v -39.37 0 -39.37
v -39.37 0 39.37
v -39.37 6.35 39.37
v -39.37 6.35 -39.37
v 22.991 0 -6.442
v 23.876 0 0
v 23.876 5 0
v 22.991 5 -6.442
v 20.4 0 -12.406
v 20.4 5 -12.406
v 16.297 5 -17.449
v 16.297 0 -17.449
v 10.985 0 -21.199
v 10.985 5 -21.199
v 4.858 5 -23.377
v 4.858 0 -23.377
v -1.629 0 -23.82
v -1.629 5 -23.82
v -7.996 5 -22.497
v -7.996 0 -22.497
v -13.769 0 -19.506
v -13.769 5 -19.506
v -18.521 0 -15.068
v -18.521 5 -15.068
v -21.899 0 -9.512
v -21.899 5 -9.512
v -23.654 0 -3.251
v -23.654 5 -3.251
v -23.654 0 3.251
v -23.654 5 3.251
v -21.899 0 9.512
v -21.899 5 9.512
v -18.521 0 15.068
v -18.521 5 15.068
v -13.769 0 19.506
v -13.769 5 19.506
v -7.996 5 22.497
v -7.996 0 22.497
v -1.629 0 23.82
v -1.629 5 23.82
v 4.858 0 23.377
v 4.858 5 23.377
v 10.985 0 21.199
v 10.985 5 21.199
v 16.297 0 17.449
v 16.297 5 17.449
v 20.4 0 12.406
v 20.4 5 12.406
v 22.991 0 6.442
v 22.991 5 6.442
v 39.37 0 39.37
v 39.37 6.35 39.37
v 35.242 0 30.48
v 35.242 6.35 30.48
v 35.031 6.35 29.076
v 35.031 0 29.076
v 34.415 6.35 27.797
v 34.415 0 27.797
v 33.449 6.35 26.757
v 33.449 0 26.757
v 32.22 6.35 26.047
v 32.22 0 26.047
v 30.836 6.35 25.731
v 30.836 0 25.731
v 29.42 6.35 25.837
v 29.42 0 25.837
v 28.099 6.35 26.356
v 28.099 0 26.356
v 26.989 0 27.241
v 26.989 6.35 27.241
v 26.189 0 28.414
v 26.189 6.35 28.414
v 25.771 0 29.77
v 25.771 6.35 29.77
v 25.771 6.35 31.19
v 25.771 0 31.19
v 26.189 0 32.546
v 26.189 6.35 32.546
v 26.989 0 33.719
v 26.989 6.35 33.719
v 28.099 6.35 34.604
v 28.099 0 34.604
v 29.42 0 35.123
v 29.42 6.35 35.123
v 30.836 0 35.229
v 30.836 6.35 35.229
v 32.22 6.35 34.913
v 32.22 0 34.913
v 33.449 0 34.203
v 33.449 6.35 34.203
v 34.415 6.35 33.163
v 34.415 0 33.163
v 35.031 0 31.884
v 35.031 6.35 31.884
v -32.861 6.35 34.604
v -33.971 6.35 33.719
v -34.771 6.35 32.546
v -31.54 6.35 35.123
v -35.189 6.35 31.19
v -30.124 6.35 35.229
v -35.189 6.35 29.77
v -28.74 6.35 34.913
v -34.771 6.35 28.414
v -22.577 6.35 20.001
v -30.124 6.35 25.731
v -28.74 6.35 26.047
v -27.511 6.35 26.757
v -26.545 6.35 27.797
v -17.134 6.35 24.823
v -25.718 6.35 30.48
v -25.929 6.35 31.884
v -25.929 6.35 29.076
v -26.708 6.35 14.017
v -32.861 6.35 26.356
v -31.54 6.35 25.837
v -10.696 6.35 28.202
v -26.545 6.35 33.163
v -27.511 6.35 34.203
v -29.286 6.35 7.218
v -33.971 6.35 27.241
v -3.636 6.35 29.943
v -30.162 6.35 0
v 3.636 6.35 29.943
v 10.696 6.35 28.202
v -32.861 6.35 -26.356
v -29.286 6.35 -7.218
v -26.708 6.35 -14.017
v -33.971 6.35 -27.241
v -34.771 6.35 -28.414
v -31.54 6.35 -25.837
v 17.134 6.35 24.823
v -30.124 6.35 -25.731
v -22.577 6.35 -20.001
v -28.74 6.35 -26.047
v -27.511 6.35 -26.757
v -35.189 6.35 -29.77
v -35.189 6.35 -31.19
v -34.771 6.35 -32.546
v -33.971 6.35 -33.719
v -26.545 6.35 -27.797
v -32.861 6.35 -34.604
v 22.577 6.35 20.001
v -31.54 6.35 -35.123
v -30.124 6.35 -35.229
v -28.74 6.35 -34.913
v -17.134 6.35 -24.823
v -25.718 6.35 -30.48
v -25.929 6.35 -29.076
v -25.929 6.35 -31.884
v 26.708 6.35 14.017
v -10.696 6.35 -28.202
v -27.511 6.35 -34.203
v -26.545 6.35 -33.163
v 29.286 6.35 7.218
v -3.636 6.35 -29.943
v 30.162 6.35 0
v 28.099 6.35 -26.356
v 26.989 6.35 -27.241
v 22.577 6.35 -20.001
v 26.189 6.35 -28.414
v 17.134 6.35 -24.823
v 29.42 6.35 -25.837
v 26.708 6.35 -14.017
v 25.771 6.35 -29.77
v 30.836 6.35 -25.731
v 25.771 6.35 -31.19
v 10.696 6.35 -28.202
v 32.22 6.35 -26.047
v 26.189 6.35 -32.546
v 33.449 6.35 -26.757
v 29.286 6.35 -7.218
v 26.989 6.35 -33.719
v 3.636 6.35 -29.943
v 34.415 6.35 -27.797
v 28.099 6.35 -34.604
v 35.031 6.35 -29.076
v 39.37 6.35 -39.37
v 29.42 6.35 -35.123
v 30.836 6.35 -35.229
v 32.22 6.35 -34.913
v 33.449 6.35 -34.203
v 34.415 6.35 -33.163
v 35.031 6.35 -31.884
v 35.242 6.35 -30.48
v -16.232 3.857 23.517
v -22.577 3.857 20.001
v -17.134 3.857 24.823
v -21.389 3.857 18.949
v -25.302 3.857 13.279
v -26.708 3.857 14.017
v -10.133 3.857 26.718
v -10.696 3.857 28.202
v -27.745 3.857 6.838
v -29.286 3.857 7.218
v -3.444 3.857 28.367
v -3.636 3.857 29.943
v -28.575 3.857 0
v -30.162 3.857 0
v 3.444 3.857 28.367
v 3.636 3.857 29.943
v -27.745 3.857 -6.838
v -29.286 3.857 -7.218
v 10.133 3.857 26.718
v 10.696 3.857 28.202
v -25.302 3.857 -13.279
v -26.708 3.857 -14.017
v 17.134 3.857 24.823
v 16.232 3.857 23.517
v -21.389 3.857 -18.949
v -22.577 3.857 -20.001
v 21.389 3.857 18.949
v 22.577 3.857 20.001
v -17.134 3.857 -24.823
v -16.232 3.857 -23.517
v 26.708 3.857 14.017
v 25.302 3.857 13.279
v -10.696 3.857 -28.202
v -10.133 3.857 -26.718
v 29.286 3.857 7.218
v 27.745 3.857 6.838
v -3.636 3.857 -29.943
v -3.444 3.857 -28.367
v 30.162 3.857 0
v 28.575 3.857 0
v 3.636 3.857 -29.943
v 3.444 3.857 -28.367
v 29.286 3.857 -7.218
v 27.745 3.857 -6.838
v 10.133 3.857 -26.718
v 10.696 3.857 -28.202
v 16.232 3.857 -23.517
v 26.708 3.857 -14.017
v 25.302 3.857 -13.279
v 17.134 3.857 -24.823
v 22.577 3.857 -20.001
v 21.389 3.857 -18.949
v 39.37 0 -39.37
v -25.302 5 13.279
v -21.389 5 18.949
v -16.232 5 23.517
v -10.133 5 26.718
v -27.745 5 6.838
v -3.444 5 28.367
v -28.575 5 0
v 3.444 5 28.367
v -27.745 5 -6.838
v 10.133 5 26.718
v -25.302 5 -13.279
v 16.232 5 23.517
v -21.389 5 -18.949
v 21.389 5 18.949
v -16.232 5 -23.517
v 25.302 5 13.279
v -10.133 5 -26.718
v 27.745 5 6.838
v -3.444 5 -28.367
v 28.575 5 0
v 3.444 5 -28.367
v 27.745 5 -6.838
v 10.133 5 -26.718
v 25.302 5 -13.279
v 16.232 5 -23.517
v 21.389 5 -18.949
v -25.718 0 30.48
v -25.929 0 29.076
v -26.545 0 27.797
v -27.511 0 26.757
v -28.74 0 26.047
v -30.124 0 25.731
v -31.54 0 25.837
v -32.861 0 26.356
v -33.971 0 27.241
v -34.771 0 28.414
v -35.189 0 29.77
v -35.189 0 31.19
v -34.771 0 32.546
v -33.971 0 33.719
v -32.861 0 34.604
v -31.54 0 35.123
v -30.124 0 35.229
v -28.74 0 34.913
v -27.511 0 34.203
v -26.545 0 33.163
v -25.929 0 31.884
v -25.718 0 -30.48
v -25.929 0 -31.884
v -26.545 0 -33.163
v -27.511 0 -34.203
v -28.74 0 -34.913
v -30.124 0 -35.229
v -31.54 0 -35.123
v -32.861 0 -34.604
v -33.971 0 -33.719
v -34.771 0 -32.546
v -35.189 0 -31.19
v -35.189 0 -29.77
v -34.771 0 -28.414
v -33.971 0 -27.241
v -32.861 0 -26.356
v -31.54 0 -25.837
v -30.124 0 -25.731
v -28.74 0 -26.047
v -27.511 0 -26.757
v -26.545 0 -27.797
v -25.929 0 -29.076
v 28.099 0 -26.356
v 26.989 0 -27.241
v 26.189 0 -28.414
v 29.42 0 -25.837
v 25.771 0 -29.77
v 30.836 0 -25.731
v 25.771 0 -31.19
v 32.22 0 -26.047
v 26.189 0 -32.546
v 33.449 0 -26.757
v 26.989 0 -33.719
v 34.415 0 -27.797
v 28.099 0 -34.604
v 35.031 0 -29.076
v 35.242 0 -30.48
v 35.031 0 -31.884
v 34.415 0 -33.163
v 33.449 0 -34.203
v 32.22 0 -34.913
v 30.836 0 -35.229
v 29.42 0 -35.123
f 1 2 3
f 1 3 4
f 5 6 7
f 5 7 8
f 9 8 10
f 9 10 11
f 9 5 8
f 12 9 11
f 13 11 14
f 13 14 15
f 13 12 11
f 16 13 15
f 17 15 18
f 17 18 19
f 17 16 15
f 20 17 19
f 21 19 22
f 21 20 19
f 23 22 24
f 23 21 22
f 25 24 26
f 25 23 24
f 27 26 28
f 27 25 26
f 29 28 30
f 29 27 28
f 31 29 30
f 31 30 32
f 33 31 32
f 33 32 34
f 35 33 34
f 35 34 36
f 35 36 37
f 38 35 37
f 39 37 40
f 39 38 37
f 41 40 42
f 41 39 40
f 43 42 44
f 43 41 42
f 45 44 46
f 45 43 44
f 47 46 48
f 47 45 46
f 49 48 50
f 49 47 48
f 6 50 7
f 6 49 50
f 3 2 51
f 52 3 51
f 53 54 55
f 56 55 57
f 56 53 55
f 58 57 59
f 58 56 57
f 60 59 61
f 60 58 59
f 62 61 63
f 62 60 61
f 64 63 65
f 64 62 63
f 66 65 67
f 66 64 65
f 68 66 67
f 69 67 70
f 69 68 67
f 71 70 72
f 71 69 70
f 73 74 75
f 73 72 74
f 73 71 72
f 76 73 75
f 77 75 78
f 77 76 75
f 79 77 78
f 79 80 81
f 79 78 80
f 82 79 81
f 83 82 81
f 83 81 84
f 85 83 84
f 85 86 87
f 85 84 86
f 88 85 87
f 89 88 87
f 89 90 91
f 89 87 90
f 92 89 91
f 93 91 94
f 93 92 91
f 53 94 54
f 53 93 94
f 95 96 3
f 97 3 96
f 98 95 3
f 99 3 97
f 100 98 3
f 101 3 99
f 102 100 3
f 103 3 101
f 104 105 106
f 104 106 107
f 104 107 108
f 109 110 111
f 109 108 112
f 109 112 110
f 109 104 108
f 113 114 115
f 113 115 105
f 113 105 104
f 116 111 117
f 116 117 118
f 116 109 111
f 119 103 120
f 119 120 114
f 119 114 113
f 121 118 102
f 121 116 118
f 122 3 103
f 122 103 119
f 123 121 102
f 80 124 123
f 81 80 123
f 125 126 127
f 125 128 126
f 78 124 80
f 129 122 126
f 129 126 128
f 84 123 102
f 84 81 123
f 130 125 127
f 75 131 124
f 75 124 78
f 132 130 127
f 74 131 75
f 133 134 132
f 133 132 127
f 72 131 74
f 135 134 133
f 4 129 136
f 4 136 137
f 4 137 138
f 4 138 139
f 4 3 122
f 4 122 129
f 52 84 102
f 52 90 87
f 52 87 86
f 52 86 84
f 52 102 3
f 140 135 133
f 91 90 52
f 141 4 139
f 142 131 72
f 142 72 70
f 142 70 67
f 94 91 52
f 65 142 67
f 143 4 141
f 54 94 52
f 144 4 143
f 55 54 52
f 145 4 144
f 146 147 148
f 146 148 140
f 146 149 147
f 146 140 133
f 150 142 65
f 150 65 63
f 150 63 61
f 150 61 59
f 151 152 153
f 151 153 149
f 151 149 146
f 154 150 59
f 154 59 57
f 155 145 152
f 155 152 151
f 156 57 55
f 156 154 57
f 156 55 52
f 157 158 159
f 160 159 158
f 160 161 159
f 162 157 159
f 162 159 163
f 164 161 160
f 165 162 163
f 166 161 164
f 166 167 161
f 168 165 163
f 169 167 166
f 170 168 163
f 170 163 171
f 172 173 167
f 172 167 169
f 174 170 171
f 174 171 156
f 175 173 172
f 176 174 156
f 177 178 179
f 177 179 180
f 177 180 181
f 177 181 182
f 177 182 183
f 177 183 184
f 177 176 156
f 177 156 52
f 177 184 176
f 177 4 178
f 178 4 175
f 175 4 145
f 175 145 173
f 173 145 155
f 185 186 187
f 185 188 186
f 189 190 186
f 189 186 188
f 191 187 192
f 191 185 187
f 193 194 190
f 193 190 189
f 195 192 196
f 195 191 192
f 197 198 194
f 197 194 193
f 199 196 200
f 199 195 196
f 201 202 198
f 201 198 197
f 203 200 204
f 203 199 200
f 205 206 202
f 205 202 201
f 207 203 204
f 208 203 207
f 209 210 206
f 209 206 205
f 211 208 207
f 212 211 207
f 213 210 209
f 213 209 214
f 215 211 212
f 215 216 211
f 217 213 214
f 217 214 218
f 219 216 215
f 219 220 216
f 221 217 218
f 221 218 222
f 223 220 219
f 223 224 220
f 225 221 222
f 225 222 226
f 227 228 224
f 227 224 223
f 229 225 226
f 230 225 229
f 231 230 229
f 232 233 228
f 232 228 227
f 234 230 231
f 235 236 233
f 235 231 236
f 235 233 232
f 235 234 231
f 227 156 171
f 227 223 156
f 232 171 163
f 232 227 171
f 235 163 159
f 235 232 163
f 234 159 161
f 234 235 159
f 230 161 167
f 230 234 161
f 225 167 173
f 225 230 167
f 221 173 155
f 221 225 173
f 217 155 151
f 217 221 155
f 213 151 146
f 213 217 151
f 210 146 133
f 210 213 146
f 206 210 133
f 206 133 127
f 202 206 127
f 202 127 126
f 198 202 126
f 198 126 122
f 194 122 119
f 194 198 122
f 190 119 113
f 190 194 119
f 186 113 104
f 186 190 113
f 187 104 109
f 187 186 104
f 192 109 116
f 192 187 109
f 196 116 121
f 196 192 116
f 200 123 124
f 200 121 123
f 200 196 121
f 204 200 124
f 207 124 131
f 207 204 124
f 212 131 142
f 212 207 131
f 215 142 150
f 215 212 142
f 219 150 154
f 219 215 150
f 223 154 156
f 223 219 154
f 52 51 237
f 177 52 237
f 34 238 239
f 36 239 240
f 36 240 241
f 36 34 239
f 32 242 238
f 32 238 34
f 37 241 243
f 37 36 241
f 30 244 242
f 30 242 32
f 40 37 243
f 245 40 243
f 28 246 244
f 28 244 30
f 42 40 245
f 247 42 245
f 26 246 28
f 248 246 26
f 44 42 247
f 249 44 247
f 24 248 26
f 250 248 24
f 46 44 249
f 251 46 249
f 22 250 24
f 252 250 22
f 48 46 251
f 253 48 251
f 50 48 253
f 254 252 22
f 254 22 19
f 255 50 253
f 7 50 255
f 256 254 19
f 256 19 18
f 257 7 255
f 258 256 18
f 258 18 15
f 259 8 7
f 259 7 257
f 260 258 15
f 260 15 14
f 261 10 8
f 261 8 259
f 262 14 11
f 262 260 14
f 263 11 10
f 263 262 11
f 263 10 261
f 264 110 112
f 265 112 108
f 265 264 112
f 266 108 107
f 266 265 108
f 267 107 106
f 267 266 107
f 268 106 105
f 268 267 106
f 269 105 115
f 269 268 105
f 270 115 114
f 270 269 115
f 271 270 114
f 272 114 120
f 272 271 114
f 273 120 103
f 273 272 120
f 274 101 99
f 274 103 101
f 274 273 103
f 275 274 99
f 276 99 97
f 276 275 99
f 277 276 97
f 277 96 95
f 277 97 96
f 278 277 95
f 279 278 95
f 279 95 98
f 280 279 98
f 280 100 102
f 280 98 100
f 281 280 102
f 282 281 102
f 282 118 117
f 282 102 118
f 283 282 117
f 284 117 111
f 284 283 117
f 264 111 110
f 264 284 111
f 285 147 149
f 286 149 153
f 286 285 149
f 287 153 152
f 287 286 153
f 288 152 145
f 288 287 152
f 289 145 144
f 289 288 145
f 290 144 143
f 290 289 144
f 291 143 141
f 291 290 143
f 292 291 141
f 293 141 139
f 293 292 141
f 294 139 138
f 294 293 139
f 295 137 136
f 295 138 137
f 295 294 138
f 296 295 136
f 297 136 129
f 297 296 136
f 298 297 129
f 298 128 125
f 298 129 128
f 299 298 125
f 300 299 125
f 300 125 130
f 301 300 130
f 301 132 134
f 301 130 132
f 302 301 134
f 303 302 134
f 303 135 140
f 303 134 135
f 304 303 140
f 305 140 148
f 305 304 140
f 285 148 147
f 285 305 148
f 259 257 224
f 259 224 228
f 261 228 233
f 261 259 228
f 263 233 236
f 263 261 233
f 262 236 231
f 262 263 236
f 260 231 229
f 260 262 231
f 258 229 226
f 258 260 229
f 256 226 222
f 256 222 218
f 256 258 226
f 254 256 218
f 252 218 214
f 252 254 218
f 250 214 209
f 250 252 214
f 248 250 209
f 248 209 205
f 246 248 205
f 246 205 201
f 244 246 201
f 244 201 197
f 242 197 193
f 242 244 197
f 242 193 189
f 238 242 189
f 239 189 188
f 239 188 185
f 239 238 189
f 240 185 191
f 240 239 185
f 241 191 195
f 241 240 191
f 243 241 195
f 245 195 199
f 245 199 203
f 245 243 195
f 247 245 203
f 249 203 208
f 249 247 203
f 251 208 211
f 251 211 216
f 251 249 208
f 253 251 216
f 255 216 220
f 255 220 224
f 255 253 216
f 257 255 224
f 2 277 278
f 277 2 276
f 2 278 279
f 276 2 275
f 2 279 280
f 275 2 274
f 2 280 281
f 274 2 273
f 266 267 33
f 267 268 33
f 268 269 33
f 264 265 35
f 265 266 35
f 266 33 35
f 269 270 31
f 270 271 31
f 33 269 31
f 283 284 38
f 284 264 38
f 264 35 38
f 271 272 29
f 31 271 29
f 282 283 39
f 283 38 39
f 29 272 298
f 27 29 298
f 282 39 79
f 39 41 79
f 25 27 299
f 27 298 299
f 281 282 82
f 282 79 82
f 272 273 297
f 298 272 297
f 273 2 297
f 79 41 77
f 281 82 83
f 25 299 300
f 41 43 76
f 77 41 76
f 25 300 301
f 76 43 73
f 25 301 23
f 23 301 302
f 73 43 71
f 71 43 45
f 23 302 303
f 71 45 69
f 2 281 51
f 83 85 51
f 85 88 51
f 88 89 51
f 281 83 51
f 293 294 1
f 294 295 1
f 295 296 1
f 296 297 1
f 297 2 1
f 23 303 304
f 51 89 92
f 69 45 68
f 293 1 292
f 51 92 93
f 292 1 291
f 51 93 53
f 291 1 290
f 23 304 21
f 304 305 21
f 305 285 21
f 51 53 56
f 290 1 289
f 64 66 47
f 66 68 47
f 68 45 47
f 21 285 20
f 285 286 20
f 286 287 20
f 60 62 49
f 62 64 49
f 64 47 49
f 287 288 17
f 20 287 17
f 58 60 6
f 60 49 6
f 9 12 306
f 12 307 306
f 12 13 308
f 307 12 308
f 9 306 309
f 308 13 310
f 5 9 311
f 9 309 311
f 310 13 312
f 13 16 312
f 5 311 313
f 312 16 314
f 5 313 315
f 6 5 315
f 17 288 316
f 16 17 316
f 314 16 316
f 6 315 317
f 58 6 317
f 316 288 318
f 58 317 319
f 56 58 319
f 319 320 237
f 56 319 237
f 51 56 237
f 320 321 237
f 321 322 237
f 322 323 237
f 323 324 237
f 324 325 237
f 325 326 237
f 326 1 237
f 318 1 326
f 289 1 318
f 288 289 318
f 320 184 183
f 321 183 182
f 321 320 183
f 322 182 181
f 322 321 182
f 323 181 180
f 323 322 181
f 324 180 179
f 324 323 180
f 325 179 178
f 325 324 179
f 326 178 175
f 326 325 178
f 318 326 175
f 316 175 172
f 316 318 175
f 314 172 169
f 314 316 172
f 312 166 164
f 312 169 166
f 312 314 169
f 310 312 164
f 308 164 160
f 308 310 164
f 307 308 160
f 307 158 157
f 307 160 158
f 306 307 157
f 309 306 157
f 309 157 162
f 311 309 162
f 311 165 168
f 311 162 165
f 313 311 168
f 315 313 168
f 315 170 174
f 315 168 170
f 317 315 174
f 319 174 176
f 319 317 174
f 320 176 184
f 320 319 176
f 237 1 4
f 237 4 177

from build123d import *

# Parameters (mm, degrees)
PLATEOUTLINE_W      = 78.74
PLATEOUTLINE_H      = 78.74
BOSS_EXTRUDE1_DEPTH = 6.35
RAILGUIDES_R        = 4.7625
CUT_EXTRUDE1_DEPTH  = 10
CUT_EXTRUDE2_START  = 5
FUELGRAINMOUNTING_R = 30.1625
CUT_EXTRUDE2_DEPTH  = 5
GASINTAKE_R         = 23.876
CUT_EXTRUDE3_DEPTH  = 5
CUT_EXTRUDE4_START  = 3.857
SKETCH1_R           = 30.1625
SKETCH1_R_2         = 28.575
CUT_EXTRUDE4_DEPTH  = 1.143


with BuildPart() as part:
    # plateOutline → Boss-Extrude1 (new body)
    with BuildSketch(Plane(origin=(0, 0, 0), x_dir=(1, 0, 0), z_dir=(0, 1, 0))):
        Rectangle(PLATEOUTLINE_W, PLATEOUTLINE_H)
    extrude(amount=BOSS_EXTRUDE1_DEPTH)

    # railGuides → Cut-Extrude1 (cut)
    with BuildSketch(Plane(origin=(0, 0, 0), x_dir=(1, 0, 0), z_dir=(0, 1, 0))):
        with Locations((-30.48, 30.48)):
            Circle(RAILGUIDES_R)
        with Locations((30.48, 30.48)):
            Circle(RAILGUIDES_R)
        with Locations((30.48, -30.48)):
            Circle(RAILGUIDES_R)
        with Locations((-30.48, -30.48)):
            Circle(RAILGUIDES_R)
    extrude(amount=CUT_EXTRUDE1_DEPTH, mode=Mode.SUBTRACT)

    # FuelGrainMounting → Cut-Extrude2 (cut)
    with BuildSketch(Plane(origin=(0, 0, 0), x_dir=(1, 0, 0), z_dir=(0, 1, 0)).offset(CUT_EXTRUDE2_START)):
        Circle(FUELGRAINMOUNTING_R)
    extrude(amount=CUT_EXTRUDE2_DEPTH, mode=Mode.SUBTRACT)

    # GasIntake → Cut-Extrude3 (cut)
    with BuildSketch(Plane(origin=(0, 0, 0), x_dir=(1, 0, 0), z_dir=(0, 1, 0))):
        Circle(GASINTAKE_R)
    extrude(amount=CUT_EXTRUDE3_DEPTH, mode=Mode.SUBTRACT)

    # Sketch1 → Cut-Extrude4 (cut)
    with BuildSketch(Plane(origin=(0, 0, 0), x_dir=(1, 0, 0), z_dir=(0, 1, 0)).offset(CUT_EXTRUDE4_START)):
        Circle(SKETCH1_R)
        Circle(SKETCH1_R_2, mode=Mode.SUBTRACT)
    extrude(amount=CUT_EXTRUDE4_DEPTH, mode=Mode.SUBTRACT)


solid = part.part
